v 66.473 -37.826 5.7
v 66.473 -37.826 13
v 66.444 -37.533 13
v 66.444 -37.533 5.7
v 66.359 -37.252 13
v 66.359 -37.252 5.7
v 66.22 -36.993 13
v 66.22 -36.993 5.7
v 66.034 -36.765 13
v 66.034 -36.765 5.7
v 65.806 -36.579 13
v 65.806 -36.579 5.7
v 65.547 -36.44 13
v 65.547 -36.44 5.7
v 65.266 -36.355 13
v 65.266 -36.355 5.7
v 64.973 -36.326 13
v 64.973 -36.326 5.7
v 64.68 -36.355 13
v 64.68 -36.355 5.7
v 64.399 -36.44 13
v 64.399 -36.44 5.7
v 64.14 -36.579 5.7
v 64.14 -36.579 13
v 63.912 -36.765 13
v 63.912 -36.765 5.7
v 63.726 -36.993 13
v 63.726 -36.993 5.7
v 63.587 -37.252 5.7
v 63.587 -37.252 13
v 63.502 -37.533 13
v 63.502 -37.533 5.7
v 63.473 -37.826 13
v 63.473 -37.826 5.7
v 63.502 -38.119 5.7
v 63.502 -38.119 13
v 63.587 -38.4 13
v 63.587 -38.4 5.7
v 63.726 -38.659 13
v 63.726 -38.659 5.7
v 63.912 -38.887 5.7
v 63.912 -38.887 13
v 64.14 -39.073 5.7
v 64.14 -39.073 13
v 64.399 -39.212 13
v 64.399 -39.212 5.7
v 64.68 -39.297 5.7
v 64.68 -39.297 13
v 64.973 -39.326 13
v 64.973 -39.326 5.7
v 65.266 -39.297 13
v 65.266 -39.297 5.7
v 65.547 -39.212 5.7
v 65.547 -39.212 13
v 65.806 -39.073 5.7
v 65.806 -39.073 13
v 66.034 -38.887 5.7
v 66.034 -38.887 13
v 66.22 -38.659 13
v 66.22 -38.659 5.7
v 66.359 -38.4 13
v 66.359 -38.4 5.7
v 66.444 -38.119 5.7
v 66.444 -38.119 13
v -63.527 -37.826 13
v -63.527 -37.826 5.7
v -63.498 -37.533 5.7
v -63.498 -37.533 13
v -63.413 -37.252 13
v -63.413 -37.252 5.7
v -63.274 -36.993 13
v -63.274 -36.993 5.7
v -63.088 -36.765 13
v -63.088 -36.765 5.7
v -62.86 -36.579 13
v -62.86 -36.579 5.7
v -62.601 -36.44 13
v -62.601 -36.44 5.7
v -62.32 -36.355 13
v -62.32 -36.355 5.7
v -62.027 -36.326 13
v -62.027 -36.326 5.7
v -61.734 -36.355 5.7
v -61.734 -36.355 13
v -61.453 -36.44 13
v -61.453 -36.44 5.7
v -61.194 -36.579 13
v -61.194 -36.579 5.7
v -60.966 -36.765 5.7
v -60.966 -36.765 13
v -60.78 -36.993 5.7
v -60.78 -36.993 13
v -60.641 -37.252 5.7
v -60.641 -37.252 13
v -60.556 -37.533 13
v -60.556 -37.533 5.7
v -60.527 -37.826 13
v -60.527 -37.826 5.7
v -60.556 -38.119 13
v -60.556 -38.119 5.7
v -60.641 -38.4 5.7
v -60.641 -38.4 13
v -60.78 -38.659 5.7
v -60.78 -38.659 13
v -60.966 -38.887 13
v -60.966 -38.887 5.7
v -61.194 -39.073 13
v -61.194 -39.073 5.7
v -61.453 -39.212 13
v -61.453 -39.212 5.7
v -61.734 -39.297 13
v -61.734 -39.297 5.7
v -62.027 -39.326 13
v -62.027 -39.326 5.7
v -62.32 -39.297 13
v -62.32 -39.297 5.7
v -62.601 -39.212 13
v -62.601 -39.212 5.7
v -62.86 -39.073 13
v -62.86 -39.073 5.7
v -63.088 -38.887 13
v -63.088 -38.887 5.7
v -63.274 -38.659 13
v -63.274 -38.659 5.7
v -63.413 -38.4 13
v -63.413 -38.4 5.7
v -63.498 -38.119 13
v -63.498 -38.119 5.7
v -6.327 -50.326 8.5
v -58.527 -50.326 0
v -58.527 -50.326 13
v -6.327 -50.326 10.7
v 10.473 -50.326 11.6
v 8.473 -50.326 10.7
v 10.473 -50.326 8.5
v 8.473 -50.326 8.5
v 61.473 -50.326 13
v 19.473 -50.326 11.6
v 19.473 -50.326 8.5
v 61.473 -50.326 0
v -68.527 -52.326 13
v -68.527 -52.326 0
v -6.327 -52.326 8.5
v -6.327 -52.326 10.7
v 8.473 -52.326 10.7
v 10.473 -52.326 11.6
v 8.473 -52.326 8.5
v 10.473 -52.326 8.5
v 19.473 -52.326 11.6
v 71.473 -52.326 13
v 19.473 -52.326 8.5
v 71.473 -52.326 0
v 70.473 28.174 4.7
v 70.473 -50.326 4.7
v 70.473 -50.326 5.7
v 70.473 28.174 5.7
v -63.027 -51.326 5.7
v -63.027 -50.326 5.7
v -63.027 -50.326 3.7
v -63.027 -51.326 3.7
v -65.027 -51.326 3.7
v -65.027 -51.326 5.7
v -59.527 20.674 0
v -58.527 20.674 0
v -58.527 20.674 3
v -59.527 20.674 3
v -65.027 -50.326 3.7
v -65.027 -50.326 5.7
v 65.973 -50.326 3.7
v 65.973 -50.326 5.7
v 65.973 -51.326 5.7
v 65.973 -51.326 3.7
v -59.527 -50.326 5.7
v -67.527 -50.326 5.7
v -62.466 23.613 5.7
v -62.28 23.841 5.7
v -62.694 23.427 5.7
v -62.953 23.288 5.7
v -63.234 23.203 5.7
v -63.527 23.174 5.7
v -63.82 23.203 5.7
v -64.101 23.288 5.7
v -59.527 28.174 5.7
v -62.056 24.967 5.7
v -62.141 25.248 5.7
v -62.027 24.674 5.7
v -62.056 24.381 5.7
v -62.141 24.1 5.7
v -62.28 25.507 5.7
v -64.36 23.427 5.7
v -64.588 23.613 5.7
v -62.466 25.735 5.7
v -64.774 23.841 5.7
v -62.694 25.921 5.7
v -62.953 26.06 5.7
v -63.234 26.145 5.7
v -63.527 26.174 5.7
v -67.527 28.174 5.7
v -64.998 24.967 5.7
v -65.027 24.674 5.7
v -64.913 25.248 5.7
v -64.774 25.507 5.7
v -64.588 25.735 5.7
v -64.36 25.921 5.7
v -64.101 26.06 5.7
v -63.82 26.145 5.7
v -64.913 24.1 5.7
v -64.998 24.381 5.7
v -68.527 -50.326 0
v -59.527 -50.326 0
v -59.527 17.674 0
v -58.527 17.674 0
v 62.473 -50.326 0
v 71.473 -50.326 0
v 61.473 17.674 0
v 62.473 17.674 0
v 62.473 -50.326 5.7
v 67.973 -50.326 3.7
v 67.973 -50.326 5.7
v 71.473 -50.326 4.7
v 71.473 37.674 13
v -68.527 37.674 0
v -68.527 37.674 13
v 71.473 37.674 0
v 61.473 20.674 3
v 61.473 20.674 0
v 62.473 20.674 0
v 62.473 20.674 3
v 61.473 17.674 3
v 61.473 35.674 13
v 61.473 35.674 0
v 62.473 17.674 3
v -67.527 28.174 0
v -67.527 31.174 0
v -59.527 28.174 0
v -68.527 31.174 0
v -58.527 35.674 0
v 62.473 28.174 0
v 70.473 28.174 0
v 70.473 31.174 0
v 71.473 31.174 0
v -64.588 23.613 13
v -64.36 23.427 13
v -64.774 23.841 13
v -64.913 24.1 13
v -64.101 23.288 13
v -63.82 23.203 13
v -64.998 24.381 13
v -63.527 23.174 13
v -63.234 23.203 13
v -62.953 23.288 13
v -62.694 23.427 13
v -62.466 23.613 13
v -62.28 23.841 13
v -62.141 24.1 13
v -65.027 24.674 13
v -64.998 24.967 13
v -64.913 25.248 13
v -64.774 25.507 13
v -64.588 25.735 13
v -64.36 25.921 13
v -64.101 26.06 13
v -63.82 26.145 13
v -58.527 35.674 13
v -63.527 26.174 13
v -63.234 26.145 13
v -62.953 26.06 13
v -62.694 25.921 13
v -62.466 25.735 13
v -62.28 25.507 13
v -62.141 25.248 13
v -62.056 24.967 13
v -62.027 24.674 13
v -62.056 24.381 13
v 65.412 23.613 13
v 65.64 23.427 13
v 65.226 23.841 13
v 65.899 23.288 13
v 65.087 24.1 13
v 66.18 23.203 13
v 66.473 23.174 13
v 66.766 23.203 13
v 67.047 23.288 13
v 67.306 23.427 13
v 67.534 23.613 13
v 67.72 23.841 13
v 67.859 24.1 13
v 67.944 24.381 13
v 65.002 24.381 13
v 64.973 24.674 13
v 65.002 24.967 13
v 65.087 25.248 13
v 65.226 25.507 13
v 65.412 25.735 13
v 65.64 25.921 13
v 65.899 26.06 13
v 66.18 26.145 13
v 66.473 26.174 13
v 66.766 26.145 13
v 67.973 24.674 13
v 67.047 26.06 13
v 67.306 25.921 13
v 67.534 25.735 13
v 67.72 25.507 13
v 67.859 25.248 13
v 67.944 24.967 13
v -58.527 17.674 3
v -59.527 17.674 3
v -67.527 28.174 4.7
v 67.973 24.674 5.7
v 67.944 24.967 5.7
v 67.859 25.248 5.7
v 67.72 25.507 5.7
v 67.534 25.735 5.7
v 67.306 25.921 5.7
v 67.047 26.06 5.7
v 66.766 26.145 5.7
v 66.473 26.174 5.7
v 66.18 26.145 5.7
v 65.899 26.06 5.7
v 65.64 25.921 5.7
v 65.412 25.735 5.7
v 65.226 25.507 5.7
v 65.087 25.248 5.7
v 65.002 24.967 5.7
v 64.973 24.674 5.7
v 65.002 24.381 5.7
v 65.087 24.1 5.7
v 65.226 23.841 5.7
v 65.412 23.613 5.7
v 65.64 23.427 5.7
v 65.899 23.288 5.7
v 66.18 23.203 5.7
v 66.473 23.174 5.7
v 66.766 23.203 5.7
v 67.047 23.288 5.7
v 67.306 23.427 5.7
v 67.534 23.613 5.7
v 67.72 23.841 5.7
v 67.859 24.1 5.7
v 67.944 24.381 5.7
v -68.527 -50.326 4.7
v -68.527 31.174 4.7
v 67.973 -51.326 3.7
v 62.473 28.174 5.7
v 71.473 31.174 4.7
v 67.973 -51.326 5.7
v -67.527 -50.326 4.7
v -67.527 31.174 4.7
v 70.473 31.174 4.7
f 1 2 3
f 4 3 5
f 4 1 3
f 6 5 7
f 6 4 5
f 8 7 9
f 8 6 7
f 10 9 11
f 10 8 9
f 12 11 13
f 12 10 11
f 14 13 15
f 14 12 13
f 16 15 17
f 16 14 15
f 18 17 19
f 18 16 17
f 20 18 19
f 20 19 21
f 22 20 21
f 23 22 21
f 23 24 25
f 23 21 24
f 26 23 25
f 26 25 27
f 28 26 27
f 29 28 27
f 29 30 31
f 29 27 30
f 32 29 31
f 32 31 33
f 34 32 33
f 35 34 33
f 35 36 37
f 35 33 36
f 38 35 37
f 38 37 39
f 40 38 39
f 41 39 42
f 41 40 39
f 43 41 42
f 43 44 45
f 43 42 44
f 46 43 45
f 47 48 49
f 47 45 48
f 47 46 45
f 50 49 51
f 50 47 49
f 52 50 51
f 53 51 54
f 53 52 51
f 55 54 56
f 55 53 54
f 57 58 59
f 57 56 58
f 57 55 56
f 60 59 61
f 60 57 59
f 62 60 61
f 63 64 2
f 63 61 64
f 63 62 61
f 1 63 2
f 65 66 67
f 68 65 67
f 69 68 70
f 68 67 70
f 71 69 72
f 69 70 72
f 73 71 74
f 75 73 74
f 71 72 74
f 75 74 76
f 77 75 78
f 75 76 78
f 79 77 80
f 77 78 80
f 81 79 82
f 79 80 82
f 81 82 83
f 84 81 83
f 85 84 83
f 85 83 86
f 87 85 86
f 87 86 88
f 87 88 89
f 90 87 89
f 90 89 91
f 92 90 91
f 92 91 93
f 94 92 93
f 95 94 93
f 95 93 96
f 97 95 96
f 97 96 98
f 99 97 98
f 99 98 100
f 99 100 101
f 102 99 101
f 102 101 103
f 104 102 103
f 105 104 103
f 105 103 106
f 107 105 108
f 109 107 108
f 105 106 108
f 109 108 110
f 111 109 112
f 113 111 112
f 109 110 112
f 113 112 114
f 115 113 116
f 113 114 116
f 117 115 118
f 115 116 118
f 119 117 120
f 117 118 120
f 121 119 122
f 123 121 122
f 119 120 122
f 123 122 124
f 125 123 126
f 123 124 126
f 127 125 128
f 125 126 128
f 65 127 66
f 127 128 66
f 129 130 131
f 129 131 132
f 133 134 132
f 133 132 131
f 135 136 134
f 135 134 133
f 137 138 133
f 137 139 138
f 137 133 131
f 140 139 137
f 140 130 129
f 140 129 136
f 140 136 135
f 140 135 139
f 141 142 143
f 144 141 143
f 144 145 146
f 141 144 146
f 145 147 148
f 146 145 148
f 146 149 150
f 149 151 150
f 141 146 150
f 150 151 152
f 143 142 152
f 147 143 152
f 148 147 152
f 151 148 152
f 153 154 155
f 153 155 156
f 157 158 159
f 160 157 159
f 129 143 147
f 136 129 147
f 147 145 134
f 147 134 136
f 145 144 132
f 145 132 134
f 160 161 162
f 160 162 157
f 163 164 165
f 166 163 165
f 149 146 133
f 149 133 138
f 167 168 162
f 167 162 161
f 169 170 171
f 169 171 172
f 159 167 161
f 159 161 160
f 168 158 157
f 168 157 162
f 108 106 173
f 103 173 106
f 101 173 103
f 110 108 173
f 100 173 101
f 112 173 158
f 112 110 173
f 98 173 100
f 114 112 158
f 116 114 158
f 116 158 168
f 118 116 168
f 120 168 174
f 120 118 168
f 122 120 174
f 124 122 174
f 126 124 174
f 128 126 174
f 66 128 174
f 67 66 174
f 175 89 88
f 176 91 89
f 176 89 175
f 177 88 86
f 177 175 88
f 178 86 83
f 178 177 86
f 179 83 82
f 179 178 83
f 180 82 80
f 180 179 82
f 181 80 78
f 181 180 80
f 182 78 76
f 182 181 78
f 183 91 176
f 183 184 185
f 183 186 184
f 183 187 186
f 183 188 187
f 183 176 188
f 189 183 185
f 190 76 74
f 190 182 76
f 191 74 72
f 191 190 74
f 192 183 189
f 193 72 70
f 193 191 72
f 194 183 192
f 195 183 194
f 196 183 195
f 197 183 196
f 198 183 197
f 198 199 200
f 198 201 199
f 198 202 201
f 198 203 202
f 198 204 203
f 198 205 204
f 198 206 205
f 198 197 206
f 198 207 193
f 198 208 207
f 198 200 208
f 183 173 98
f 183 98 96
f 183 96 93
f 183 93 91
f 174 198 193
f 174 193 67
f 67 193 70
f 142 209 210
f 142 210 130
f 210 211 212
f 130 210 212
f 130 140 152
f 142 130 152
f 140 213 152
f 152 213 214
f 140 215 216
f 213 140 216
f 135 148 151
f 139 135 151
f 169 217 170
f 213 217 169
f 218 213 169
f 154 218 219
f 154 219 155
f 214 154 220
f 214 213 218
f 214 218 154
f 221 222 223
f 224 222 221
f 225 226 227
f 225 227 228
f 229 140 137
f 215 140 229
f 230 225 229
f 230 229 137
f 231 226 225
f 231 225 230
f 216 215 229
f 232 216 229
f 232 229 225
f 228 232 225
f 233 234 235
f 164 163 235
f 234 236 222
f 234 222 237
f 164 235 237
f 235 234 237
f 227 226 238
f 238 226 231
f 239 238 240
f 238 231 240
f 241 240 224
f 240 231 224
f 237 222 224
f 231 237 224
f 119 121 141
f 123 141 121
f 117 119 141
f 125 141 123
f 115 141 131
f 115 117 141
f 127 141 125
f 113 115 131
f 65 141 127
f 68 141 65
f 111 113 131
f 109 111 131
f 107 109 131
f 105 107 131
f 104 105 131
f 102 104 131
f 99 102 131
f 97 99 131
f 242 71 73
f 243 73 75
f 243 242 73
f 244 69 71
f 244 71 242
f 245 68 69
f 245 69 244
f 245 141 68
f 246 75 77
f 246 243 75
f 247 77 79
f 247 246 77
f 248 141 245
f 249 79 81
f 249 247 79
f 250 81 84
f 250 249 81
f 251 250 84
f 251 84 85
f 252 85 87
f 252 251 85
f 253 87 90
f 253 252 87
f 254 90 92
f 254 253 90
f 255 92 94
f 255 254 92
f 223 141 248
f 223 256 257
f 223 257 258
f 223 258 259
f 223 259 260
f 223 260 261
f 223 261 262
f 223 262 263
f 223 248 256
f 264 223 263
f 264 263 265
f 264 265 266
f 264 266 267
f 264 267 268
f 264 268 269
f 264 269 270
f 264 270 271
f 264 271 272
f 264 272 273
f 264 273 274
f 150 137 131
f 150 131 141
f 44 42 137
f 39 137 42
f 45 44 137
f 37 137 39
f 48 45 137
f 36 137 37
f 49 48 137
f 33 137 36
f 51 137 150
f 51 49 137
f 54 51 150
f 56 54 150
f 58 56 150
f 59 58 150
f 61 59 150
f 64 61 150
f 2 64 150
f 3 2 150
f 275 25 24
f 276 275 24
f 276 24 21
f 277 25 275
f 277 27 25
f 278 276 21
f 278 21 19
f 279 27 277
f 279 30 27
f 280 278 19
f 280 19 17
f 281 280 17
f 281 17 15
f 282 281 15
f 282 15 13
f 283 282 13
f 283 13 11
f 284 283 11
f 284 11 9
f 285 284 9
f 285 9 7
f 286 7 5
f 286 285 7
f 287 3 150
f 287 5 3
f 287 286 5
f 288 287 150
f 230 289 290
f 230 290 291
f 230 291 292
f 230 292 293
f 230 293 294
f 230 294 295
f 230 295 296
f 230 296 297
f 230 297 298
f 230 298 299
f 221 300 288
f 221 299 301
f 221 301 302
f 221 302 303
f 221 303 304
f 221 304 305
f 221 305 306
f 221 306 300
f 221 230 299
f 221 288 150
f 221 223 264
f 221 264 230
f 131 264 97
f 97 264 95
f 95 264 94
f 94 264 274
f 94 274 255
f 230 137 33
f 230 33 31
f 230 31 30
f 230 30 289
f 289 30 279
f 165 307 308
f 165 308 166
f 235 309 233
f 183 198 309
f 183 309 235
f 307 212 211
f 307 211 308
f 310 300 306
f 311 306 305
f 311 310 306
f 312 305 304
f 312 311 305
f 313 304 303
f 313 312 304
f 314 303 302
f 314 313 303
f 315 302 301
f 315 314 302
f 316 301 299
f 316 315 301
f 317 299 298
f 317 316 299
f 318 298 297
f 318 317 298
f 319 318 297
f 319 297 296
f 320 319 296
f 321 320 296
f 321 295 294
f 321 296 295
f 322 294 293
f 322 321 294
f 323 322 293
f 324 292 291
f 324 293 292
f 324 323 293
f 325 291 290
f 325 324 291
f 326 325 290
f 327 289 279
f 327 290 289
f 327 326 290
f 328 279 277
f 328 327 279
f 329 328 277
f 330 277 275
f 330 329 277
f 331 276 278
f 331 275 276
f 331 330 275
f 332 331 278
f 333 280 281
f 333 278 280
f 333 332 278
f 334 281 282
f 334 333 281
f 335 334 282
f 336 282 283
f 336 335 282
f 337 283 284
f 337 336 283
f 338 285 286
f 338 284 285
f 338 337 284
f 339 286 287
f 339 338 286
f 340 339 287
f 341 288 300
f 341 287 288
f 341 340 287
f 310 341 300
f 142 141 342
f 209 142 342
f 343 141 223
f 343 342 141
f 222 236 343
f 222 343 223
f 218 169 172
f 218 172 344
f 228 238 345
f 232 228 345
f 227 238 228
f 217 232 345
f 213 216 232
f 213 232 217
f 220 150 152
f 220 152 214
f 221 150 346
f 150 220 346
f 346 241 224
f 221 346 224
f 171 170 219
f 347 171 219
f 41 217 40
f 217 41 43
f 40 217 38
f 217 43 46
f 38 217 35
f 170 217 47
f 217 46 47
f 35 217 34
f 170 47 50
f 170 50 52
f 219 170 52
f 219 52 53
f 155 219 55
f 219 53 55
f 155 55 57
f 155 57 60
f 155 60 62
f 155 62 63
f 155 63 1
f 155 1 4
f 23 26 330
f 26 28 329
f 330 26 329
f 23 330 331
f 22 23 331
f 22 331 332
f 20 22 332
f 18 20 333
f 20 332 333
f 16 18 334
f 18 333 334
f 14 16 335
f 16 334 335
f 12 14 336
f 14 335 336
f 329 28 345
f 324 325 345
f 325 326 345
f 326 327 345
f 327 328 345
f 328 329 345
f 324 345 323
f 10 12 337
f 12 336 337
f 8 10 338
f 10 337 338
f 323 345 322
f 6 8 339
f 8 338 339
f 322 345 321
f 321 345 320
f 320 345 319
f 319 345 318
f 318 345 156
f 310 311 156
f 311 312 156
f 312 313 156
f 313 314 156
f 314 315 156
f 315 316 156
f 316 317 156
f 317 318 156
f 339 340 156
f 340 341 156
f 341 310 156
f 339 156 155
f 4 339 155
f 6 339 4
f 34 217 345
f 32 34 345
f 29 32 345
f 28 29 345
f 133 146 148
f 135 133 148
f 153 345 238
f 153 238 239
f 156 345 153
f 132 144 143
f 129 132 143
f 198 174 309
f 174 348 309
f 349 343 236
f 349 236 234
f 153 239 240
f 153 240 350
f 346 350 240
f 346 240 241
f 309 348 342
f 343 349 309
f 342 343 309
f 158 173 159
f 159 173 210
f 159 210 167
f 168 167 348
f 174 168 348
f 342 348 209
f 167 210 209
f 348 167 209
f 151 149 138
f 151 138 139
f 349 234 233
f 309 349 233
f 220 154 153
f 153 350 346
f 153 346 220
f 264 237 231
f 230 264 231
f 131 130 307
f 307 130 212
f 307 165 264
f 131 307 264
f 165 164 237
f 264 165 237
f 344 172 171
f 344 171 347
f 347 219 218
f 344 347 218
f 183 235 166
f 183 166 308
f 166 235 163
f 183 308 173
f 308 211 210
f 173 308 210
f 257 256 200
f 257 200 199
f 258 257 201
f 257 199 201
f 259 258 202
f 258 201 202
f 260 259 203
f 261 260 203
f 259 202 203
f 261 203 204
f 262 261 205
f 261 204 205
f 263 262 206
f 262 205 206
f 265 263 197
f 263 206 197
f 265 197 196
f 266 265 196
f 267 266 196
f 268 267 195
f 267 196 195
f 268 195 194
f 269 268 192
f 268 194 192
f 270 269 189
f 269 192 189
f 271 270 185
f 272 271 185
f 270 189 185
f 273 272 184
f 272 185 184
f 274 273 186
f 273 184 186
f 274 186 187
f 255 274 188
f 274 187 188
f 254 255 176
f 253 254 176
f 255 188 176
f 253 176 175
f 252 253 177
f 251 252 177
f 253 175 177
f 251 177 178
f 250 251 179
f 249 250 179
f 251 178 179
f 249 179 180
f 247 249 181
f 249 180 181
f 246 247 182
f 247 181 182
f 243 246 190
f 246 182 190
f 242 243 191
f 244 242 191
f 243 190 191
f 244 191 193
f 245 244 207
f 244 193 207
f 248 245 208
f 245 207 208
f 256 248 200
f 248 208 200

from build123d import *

# Parameters (mm, degrees)
SKETCH1_W           = 140
SKETCH1_H           = 90
SKETCH1_W_2         = 120
SKETCH1_H_2         = 86
BOSS_EXTRUDE1_DEPTH = 13
SKETCH13_R          = 1.5
SKETCH13_W          = 4.8
SKETCH13_H          = 4
CUT_EXTRUDE5_DEPTH  = 5.7
SKETCH13_6_W        = 1
SKETCH13_6_H        = 5
SKETCH13_6_H_2      = 4
CUT_EXTRUDE6_DEPTH  = 4.7
SKETCH13_7_R        = 1.5
CUT_EXTRUDE7_DEPTH  = 90.528818352
SKETCH15_W          = 3
SKETCH15_H          = 3
CUT_EXTRUDE8_DEPTH  = 10
SKETCH16_W          = 1
SKETCH16_H          = 4.7
CUT_EXTRUDE9_DEPTH  = 0.5
SKETCH16_3_W        = 1
SKETCH16_3_H        = 4.7
CUT_EXTRUDE10_DEPTH = 3.5
SKETCH17_W          = 2
SKETCH17_H          = 2
CUT_EXTRUDE11_DEPTH = 1
SKETCH18_W          = 14.8
SKETCH18_H          = 2.2
SKETCH18_W_2        = 9
SKETCH18_H_2        = 3.1
CUT_EXTRUDE13_DEPTH = 2


with BuildPart() as part:
    # Sketch1 → Boss-Extrude1 (new body)
    with BuildSketch(Plane.XY):
        with Locations((1.473041333, -7.32603251)):
            Rectangle(SKETCH1_W, SKETCH1_H)
        with Locations((1.473041333, -7.32603251)):
            Rectangle(SKETCH1_W_2, SKETCH1_H_2, mode=Mode.SUBTRACT)
    extrude(amount=BOSS_EXTRUDE1_DEPTH)

    # Sketch13 → Cut-Extrude5 (cut)
    # profile 1 of 2: a face of its own
    with BuildSketch(Plane(origin=(0, 0, 0), x_dir=(-1, 0, 0), z_dir=(0, 0, -1))):
        Polygon((59.526958667, 27.67396749), (59.526958667, -50.32603251), (67.526958667, -50.32603251), (67.526958667, -45.32603251), (62.726958667, -45.32603251), (62.726958667, -41.32603251), (67.526958667, -41.32603251), (67.526958667, 27.67396749), align=None)
        with Locations((62.026958667, -37.82603251)):
            Circle(SKETCH13_R, mode=Mode.SUBTRACT)
        with Locations((63.526958667, 24.67396749)):
            Circle(SKETCH13_R, mode=Mode.SUBTRACT)
    # profile 2 of 2: a face of its own
    with BuildSketch(Plane(origin=(0, 0, 0), x_dir=(-1, 0, 0), z_dir=(0, 0, -1))):
        with Locations((65.126958667, -43.32603251)):
            Rectangle(SKETCH13_W, SKETCH13_H)
    cut_extrude5 = extrude(amount=-CUT_EXTRUDE5_DEPTH, mode=Mode.SUBTRACT)

    # Sketch13<6> → Cut-Extrude6 (cut)
    with BuildSketch(Plane(origin=(0, 0, 0), x_dir=(-1, 0, 0), z_dir=(0, 0, -1))):
        Polygon((67.526958667, 30.67396749), (67.526958667, 27.67396749), (67.526958667, -41.32603251), (68.526958667, -41.32603251), (68.526958667, 30.67396749), align=None)
        with Locations((68.026958667, -47.82603251)):
            Rectangle(SKETCH13_6_W, SKETCH13_6_H)
        with Locations((68.026958667, -43.32603251)):
            Rectangle(SKETCH13_6_W, SKETCH13_6_H_2)
    cut_extrude6 = extrude(amount=-CUT_EXTRUDE6_DEPTH, mode=Mode.SUBTRACT)

    # Sketch13<7> → Cut-Extrude7 (cut, symmetric)
    with BuildSketch(Plane(origin=(0, 0, 0), x_dir=(-1, 0, 0), z_dir=(0, 0, -1))):
        with Locations((62.026958667, -37.82603251)):
            Circle(SKETCH13_7_R)
        with Locations((63.526958667, 24.67396749)):
            Circle(SKETCH13_7_R)
    cut_extrude7 = extrude(amount=CUT_EXTRUDE7_DEPTH, both=True, mode=Mode.SUBTRACT)

    # Sketch15 → Cut-Extrude8 (cut)
    with BuildSketch(Plane.ZY.offset(-61.473041333)):
        with Locations((1.5, 19.17396749)):
            Rectangle(SKETCH15_W, SKETCH15_H)
    cut_extrude8 = extrude(amount=-CUT_EXTRUDE8_DEPTH, mode=Mode.SUBTRACT)

    # Mirror1: Cut-Extrude5, Cut-Extrude6, Cut-Extrude7, Cut-Extrude8 across plane
    add(cut_extrude5.mirror(Plane(origin=(1.473041333, 0, 0), x_dir=(0, 0, 1), z_dir=(1, 0, 0))), mode=Mode.SUBTRACT)
    add(cut_extrude6.mirror(Plane(origin=(1.473041333, 0, 0), x_dir=(0, 0, 1), z_dir=(1, 0, 0))), mode=Mode.SUBTRACT)
    add(cut_extrude7.mirror(Plane(origin=(1.473041333, 0, 0), x_dir=(0, 0, 1), z_dir=(1, 0, 0))), mode=Mode.SUBTRACT)
    add(cut_extrude8.mirror(Plane(origin=(1.473041333, 0, 0), x_dir=(0, 0, 1), z_dir=(1, 0, 0))), mode=Mode.SUBTRACT)

    # Sketch16 → Cut-Extrude9 (cut)
    with BuildSketch(Plane.XZ.offset(-27.67396749)):
        Polygon((-59.526958667, 0), (-59.526958667, 5.7), (-67.526958667, 5.7), (-67.526958667, 4.7), (-67.526958667, 0), align=None)
        with Locations((-68.026958667, 2.35)):
            Rectangle(SKETCH16_W, SKETCH16_H)
        Polygon((70.473041333, 5.7), (62.473041333, 5.7), (62.473041333, 0), (70.473041333, 0), (70.473041333, 4.7), align=None)
        with Locations((70.973041333, 2.35)):
            Rectangle(SKETCH16_W, SKETCH16_H)
    extrude(amount=-CUT_EXTRUDE9_DEPTH, mode=Mode.SUBTRACT)

    # Sketch16<3> → Cut-Extrude10 (cut)
    with BuildSketch(Plane.XZ.offset(-27.67396749)):
        with Locations((-68.026958667, 2.35)):
            Rectangle(SKETCH16_3_W, SKETCH16_3_H)
        with Locations((70.973041333, 2.35)):
            Rectangle(SKETCH16_3_W, SKETCH16_3_H)
    extrude(amount=-CUT_EXTRUDE10_DEPTH, mode=Mode.SUBTRACT)

    # Sketch17 → Cut-Extrude11 (cut)
    with BuildSketch(Plane(origin=(0, -50.32603251, 0), x_dir=(1, 0, 0), z_dir=(0, 1, 0))):
        with Locations((-64.026958667, -4.7)):
            Rectangle(SKETCH17_W, SKETCH17_H)
        with Locations((66.973041333, -4.7)):
            Rectangle(SKETCH17_W, SKETCH17_H)
    extrude(amount=-CUT_EXTRUDE11_DEPTH, mode=Mode.SUBTRACT)

    # Sketch18 → Cut-Extrude13 (cut)
    with BuildSketch(Plane(origin=(0, -52.32603251, 0), x_dir=(1, 0, 0), z_dir=(0, 1, 0))):
        with Locations((1.073041333, -9.6)):
            Rectangle(SKETCH18_W, SKETCH18_H)
        with Locations((14.973041333, -10.05)):
            Rectangle(SKETCH18_W_2, SKETCH18_H_2)
    extrude(amount=CUT_EXTRUDE13_DEPTH, mode=Mode.SUBTRACT)


solid = part.part
